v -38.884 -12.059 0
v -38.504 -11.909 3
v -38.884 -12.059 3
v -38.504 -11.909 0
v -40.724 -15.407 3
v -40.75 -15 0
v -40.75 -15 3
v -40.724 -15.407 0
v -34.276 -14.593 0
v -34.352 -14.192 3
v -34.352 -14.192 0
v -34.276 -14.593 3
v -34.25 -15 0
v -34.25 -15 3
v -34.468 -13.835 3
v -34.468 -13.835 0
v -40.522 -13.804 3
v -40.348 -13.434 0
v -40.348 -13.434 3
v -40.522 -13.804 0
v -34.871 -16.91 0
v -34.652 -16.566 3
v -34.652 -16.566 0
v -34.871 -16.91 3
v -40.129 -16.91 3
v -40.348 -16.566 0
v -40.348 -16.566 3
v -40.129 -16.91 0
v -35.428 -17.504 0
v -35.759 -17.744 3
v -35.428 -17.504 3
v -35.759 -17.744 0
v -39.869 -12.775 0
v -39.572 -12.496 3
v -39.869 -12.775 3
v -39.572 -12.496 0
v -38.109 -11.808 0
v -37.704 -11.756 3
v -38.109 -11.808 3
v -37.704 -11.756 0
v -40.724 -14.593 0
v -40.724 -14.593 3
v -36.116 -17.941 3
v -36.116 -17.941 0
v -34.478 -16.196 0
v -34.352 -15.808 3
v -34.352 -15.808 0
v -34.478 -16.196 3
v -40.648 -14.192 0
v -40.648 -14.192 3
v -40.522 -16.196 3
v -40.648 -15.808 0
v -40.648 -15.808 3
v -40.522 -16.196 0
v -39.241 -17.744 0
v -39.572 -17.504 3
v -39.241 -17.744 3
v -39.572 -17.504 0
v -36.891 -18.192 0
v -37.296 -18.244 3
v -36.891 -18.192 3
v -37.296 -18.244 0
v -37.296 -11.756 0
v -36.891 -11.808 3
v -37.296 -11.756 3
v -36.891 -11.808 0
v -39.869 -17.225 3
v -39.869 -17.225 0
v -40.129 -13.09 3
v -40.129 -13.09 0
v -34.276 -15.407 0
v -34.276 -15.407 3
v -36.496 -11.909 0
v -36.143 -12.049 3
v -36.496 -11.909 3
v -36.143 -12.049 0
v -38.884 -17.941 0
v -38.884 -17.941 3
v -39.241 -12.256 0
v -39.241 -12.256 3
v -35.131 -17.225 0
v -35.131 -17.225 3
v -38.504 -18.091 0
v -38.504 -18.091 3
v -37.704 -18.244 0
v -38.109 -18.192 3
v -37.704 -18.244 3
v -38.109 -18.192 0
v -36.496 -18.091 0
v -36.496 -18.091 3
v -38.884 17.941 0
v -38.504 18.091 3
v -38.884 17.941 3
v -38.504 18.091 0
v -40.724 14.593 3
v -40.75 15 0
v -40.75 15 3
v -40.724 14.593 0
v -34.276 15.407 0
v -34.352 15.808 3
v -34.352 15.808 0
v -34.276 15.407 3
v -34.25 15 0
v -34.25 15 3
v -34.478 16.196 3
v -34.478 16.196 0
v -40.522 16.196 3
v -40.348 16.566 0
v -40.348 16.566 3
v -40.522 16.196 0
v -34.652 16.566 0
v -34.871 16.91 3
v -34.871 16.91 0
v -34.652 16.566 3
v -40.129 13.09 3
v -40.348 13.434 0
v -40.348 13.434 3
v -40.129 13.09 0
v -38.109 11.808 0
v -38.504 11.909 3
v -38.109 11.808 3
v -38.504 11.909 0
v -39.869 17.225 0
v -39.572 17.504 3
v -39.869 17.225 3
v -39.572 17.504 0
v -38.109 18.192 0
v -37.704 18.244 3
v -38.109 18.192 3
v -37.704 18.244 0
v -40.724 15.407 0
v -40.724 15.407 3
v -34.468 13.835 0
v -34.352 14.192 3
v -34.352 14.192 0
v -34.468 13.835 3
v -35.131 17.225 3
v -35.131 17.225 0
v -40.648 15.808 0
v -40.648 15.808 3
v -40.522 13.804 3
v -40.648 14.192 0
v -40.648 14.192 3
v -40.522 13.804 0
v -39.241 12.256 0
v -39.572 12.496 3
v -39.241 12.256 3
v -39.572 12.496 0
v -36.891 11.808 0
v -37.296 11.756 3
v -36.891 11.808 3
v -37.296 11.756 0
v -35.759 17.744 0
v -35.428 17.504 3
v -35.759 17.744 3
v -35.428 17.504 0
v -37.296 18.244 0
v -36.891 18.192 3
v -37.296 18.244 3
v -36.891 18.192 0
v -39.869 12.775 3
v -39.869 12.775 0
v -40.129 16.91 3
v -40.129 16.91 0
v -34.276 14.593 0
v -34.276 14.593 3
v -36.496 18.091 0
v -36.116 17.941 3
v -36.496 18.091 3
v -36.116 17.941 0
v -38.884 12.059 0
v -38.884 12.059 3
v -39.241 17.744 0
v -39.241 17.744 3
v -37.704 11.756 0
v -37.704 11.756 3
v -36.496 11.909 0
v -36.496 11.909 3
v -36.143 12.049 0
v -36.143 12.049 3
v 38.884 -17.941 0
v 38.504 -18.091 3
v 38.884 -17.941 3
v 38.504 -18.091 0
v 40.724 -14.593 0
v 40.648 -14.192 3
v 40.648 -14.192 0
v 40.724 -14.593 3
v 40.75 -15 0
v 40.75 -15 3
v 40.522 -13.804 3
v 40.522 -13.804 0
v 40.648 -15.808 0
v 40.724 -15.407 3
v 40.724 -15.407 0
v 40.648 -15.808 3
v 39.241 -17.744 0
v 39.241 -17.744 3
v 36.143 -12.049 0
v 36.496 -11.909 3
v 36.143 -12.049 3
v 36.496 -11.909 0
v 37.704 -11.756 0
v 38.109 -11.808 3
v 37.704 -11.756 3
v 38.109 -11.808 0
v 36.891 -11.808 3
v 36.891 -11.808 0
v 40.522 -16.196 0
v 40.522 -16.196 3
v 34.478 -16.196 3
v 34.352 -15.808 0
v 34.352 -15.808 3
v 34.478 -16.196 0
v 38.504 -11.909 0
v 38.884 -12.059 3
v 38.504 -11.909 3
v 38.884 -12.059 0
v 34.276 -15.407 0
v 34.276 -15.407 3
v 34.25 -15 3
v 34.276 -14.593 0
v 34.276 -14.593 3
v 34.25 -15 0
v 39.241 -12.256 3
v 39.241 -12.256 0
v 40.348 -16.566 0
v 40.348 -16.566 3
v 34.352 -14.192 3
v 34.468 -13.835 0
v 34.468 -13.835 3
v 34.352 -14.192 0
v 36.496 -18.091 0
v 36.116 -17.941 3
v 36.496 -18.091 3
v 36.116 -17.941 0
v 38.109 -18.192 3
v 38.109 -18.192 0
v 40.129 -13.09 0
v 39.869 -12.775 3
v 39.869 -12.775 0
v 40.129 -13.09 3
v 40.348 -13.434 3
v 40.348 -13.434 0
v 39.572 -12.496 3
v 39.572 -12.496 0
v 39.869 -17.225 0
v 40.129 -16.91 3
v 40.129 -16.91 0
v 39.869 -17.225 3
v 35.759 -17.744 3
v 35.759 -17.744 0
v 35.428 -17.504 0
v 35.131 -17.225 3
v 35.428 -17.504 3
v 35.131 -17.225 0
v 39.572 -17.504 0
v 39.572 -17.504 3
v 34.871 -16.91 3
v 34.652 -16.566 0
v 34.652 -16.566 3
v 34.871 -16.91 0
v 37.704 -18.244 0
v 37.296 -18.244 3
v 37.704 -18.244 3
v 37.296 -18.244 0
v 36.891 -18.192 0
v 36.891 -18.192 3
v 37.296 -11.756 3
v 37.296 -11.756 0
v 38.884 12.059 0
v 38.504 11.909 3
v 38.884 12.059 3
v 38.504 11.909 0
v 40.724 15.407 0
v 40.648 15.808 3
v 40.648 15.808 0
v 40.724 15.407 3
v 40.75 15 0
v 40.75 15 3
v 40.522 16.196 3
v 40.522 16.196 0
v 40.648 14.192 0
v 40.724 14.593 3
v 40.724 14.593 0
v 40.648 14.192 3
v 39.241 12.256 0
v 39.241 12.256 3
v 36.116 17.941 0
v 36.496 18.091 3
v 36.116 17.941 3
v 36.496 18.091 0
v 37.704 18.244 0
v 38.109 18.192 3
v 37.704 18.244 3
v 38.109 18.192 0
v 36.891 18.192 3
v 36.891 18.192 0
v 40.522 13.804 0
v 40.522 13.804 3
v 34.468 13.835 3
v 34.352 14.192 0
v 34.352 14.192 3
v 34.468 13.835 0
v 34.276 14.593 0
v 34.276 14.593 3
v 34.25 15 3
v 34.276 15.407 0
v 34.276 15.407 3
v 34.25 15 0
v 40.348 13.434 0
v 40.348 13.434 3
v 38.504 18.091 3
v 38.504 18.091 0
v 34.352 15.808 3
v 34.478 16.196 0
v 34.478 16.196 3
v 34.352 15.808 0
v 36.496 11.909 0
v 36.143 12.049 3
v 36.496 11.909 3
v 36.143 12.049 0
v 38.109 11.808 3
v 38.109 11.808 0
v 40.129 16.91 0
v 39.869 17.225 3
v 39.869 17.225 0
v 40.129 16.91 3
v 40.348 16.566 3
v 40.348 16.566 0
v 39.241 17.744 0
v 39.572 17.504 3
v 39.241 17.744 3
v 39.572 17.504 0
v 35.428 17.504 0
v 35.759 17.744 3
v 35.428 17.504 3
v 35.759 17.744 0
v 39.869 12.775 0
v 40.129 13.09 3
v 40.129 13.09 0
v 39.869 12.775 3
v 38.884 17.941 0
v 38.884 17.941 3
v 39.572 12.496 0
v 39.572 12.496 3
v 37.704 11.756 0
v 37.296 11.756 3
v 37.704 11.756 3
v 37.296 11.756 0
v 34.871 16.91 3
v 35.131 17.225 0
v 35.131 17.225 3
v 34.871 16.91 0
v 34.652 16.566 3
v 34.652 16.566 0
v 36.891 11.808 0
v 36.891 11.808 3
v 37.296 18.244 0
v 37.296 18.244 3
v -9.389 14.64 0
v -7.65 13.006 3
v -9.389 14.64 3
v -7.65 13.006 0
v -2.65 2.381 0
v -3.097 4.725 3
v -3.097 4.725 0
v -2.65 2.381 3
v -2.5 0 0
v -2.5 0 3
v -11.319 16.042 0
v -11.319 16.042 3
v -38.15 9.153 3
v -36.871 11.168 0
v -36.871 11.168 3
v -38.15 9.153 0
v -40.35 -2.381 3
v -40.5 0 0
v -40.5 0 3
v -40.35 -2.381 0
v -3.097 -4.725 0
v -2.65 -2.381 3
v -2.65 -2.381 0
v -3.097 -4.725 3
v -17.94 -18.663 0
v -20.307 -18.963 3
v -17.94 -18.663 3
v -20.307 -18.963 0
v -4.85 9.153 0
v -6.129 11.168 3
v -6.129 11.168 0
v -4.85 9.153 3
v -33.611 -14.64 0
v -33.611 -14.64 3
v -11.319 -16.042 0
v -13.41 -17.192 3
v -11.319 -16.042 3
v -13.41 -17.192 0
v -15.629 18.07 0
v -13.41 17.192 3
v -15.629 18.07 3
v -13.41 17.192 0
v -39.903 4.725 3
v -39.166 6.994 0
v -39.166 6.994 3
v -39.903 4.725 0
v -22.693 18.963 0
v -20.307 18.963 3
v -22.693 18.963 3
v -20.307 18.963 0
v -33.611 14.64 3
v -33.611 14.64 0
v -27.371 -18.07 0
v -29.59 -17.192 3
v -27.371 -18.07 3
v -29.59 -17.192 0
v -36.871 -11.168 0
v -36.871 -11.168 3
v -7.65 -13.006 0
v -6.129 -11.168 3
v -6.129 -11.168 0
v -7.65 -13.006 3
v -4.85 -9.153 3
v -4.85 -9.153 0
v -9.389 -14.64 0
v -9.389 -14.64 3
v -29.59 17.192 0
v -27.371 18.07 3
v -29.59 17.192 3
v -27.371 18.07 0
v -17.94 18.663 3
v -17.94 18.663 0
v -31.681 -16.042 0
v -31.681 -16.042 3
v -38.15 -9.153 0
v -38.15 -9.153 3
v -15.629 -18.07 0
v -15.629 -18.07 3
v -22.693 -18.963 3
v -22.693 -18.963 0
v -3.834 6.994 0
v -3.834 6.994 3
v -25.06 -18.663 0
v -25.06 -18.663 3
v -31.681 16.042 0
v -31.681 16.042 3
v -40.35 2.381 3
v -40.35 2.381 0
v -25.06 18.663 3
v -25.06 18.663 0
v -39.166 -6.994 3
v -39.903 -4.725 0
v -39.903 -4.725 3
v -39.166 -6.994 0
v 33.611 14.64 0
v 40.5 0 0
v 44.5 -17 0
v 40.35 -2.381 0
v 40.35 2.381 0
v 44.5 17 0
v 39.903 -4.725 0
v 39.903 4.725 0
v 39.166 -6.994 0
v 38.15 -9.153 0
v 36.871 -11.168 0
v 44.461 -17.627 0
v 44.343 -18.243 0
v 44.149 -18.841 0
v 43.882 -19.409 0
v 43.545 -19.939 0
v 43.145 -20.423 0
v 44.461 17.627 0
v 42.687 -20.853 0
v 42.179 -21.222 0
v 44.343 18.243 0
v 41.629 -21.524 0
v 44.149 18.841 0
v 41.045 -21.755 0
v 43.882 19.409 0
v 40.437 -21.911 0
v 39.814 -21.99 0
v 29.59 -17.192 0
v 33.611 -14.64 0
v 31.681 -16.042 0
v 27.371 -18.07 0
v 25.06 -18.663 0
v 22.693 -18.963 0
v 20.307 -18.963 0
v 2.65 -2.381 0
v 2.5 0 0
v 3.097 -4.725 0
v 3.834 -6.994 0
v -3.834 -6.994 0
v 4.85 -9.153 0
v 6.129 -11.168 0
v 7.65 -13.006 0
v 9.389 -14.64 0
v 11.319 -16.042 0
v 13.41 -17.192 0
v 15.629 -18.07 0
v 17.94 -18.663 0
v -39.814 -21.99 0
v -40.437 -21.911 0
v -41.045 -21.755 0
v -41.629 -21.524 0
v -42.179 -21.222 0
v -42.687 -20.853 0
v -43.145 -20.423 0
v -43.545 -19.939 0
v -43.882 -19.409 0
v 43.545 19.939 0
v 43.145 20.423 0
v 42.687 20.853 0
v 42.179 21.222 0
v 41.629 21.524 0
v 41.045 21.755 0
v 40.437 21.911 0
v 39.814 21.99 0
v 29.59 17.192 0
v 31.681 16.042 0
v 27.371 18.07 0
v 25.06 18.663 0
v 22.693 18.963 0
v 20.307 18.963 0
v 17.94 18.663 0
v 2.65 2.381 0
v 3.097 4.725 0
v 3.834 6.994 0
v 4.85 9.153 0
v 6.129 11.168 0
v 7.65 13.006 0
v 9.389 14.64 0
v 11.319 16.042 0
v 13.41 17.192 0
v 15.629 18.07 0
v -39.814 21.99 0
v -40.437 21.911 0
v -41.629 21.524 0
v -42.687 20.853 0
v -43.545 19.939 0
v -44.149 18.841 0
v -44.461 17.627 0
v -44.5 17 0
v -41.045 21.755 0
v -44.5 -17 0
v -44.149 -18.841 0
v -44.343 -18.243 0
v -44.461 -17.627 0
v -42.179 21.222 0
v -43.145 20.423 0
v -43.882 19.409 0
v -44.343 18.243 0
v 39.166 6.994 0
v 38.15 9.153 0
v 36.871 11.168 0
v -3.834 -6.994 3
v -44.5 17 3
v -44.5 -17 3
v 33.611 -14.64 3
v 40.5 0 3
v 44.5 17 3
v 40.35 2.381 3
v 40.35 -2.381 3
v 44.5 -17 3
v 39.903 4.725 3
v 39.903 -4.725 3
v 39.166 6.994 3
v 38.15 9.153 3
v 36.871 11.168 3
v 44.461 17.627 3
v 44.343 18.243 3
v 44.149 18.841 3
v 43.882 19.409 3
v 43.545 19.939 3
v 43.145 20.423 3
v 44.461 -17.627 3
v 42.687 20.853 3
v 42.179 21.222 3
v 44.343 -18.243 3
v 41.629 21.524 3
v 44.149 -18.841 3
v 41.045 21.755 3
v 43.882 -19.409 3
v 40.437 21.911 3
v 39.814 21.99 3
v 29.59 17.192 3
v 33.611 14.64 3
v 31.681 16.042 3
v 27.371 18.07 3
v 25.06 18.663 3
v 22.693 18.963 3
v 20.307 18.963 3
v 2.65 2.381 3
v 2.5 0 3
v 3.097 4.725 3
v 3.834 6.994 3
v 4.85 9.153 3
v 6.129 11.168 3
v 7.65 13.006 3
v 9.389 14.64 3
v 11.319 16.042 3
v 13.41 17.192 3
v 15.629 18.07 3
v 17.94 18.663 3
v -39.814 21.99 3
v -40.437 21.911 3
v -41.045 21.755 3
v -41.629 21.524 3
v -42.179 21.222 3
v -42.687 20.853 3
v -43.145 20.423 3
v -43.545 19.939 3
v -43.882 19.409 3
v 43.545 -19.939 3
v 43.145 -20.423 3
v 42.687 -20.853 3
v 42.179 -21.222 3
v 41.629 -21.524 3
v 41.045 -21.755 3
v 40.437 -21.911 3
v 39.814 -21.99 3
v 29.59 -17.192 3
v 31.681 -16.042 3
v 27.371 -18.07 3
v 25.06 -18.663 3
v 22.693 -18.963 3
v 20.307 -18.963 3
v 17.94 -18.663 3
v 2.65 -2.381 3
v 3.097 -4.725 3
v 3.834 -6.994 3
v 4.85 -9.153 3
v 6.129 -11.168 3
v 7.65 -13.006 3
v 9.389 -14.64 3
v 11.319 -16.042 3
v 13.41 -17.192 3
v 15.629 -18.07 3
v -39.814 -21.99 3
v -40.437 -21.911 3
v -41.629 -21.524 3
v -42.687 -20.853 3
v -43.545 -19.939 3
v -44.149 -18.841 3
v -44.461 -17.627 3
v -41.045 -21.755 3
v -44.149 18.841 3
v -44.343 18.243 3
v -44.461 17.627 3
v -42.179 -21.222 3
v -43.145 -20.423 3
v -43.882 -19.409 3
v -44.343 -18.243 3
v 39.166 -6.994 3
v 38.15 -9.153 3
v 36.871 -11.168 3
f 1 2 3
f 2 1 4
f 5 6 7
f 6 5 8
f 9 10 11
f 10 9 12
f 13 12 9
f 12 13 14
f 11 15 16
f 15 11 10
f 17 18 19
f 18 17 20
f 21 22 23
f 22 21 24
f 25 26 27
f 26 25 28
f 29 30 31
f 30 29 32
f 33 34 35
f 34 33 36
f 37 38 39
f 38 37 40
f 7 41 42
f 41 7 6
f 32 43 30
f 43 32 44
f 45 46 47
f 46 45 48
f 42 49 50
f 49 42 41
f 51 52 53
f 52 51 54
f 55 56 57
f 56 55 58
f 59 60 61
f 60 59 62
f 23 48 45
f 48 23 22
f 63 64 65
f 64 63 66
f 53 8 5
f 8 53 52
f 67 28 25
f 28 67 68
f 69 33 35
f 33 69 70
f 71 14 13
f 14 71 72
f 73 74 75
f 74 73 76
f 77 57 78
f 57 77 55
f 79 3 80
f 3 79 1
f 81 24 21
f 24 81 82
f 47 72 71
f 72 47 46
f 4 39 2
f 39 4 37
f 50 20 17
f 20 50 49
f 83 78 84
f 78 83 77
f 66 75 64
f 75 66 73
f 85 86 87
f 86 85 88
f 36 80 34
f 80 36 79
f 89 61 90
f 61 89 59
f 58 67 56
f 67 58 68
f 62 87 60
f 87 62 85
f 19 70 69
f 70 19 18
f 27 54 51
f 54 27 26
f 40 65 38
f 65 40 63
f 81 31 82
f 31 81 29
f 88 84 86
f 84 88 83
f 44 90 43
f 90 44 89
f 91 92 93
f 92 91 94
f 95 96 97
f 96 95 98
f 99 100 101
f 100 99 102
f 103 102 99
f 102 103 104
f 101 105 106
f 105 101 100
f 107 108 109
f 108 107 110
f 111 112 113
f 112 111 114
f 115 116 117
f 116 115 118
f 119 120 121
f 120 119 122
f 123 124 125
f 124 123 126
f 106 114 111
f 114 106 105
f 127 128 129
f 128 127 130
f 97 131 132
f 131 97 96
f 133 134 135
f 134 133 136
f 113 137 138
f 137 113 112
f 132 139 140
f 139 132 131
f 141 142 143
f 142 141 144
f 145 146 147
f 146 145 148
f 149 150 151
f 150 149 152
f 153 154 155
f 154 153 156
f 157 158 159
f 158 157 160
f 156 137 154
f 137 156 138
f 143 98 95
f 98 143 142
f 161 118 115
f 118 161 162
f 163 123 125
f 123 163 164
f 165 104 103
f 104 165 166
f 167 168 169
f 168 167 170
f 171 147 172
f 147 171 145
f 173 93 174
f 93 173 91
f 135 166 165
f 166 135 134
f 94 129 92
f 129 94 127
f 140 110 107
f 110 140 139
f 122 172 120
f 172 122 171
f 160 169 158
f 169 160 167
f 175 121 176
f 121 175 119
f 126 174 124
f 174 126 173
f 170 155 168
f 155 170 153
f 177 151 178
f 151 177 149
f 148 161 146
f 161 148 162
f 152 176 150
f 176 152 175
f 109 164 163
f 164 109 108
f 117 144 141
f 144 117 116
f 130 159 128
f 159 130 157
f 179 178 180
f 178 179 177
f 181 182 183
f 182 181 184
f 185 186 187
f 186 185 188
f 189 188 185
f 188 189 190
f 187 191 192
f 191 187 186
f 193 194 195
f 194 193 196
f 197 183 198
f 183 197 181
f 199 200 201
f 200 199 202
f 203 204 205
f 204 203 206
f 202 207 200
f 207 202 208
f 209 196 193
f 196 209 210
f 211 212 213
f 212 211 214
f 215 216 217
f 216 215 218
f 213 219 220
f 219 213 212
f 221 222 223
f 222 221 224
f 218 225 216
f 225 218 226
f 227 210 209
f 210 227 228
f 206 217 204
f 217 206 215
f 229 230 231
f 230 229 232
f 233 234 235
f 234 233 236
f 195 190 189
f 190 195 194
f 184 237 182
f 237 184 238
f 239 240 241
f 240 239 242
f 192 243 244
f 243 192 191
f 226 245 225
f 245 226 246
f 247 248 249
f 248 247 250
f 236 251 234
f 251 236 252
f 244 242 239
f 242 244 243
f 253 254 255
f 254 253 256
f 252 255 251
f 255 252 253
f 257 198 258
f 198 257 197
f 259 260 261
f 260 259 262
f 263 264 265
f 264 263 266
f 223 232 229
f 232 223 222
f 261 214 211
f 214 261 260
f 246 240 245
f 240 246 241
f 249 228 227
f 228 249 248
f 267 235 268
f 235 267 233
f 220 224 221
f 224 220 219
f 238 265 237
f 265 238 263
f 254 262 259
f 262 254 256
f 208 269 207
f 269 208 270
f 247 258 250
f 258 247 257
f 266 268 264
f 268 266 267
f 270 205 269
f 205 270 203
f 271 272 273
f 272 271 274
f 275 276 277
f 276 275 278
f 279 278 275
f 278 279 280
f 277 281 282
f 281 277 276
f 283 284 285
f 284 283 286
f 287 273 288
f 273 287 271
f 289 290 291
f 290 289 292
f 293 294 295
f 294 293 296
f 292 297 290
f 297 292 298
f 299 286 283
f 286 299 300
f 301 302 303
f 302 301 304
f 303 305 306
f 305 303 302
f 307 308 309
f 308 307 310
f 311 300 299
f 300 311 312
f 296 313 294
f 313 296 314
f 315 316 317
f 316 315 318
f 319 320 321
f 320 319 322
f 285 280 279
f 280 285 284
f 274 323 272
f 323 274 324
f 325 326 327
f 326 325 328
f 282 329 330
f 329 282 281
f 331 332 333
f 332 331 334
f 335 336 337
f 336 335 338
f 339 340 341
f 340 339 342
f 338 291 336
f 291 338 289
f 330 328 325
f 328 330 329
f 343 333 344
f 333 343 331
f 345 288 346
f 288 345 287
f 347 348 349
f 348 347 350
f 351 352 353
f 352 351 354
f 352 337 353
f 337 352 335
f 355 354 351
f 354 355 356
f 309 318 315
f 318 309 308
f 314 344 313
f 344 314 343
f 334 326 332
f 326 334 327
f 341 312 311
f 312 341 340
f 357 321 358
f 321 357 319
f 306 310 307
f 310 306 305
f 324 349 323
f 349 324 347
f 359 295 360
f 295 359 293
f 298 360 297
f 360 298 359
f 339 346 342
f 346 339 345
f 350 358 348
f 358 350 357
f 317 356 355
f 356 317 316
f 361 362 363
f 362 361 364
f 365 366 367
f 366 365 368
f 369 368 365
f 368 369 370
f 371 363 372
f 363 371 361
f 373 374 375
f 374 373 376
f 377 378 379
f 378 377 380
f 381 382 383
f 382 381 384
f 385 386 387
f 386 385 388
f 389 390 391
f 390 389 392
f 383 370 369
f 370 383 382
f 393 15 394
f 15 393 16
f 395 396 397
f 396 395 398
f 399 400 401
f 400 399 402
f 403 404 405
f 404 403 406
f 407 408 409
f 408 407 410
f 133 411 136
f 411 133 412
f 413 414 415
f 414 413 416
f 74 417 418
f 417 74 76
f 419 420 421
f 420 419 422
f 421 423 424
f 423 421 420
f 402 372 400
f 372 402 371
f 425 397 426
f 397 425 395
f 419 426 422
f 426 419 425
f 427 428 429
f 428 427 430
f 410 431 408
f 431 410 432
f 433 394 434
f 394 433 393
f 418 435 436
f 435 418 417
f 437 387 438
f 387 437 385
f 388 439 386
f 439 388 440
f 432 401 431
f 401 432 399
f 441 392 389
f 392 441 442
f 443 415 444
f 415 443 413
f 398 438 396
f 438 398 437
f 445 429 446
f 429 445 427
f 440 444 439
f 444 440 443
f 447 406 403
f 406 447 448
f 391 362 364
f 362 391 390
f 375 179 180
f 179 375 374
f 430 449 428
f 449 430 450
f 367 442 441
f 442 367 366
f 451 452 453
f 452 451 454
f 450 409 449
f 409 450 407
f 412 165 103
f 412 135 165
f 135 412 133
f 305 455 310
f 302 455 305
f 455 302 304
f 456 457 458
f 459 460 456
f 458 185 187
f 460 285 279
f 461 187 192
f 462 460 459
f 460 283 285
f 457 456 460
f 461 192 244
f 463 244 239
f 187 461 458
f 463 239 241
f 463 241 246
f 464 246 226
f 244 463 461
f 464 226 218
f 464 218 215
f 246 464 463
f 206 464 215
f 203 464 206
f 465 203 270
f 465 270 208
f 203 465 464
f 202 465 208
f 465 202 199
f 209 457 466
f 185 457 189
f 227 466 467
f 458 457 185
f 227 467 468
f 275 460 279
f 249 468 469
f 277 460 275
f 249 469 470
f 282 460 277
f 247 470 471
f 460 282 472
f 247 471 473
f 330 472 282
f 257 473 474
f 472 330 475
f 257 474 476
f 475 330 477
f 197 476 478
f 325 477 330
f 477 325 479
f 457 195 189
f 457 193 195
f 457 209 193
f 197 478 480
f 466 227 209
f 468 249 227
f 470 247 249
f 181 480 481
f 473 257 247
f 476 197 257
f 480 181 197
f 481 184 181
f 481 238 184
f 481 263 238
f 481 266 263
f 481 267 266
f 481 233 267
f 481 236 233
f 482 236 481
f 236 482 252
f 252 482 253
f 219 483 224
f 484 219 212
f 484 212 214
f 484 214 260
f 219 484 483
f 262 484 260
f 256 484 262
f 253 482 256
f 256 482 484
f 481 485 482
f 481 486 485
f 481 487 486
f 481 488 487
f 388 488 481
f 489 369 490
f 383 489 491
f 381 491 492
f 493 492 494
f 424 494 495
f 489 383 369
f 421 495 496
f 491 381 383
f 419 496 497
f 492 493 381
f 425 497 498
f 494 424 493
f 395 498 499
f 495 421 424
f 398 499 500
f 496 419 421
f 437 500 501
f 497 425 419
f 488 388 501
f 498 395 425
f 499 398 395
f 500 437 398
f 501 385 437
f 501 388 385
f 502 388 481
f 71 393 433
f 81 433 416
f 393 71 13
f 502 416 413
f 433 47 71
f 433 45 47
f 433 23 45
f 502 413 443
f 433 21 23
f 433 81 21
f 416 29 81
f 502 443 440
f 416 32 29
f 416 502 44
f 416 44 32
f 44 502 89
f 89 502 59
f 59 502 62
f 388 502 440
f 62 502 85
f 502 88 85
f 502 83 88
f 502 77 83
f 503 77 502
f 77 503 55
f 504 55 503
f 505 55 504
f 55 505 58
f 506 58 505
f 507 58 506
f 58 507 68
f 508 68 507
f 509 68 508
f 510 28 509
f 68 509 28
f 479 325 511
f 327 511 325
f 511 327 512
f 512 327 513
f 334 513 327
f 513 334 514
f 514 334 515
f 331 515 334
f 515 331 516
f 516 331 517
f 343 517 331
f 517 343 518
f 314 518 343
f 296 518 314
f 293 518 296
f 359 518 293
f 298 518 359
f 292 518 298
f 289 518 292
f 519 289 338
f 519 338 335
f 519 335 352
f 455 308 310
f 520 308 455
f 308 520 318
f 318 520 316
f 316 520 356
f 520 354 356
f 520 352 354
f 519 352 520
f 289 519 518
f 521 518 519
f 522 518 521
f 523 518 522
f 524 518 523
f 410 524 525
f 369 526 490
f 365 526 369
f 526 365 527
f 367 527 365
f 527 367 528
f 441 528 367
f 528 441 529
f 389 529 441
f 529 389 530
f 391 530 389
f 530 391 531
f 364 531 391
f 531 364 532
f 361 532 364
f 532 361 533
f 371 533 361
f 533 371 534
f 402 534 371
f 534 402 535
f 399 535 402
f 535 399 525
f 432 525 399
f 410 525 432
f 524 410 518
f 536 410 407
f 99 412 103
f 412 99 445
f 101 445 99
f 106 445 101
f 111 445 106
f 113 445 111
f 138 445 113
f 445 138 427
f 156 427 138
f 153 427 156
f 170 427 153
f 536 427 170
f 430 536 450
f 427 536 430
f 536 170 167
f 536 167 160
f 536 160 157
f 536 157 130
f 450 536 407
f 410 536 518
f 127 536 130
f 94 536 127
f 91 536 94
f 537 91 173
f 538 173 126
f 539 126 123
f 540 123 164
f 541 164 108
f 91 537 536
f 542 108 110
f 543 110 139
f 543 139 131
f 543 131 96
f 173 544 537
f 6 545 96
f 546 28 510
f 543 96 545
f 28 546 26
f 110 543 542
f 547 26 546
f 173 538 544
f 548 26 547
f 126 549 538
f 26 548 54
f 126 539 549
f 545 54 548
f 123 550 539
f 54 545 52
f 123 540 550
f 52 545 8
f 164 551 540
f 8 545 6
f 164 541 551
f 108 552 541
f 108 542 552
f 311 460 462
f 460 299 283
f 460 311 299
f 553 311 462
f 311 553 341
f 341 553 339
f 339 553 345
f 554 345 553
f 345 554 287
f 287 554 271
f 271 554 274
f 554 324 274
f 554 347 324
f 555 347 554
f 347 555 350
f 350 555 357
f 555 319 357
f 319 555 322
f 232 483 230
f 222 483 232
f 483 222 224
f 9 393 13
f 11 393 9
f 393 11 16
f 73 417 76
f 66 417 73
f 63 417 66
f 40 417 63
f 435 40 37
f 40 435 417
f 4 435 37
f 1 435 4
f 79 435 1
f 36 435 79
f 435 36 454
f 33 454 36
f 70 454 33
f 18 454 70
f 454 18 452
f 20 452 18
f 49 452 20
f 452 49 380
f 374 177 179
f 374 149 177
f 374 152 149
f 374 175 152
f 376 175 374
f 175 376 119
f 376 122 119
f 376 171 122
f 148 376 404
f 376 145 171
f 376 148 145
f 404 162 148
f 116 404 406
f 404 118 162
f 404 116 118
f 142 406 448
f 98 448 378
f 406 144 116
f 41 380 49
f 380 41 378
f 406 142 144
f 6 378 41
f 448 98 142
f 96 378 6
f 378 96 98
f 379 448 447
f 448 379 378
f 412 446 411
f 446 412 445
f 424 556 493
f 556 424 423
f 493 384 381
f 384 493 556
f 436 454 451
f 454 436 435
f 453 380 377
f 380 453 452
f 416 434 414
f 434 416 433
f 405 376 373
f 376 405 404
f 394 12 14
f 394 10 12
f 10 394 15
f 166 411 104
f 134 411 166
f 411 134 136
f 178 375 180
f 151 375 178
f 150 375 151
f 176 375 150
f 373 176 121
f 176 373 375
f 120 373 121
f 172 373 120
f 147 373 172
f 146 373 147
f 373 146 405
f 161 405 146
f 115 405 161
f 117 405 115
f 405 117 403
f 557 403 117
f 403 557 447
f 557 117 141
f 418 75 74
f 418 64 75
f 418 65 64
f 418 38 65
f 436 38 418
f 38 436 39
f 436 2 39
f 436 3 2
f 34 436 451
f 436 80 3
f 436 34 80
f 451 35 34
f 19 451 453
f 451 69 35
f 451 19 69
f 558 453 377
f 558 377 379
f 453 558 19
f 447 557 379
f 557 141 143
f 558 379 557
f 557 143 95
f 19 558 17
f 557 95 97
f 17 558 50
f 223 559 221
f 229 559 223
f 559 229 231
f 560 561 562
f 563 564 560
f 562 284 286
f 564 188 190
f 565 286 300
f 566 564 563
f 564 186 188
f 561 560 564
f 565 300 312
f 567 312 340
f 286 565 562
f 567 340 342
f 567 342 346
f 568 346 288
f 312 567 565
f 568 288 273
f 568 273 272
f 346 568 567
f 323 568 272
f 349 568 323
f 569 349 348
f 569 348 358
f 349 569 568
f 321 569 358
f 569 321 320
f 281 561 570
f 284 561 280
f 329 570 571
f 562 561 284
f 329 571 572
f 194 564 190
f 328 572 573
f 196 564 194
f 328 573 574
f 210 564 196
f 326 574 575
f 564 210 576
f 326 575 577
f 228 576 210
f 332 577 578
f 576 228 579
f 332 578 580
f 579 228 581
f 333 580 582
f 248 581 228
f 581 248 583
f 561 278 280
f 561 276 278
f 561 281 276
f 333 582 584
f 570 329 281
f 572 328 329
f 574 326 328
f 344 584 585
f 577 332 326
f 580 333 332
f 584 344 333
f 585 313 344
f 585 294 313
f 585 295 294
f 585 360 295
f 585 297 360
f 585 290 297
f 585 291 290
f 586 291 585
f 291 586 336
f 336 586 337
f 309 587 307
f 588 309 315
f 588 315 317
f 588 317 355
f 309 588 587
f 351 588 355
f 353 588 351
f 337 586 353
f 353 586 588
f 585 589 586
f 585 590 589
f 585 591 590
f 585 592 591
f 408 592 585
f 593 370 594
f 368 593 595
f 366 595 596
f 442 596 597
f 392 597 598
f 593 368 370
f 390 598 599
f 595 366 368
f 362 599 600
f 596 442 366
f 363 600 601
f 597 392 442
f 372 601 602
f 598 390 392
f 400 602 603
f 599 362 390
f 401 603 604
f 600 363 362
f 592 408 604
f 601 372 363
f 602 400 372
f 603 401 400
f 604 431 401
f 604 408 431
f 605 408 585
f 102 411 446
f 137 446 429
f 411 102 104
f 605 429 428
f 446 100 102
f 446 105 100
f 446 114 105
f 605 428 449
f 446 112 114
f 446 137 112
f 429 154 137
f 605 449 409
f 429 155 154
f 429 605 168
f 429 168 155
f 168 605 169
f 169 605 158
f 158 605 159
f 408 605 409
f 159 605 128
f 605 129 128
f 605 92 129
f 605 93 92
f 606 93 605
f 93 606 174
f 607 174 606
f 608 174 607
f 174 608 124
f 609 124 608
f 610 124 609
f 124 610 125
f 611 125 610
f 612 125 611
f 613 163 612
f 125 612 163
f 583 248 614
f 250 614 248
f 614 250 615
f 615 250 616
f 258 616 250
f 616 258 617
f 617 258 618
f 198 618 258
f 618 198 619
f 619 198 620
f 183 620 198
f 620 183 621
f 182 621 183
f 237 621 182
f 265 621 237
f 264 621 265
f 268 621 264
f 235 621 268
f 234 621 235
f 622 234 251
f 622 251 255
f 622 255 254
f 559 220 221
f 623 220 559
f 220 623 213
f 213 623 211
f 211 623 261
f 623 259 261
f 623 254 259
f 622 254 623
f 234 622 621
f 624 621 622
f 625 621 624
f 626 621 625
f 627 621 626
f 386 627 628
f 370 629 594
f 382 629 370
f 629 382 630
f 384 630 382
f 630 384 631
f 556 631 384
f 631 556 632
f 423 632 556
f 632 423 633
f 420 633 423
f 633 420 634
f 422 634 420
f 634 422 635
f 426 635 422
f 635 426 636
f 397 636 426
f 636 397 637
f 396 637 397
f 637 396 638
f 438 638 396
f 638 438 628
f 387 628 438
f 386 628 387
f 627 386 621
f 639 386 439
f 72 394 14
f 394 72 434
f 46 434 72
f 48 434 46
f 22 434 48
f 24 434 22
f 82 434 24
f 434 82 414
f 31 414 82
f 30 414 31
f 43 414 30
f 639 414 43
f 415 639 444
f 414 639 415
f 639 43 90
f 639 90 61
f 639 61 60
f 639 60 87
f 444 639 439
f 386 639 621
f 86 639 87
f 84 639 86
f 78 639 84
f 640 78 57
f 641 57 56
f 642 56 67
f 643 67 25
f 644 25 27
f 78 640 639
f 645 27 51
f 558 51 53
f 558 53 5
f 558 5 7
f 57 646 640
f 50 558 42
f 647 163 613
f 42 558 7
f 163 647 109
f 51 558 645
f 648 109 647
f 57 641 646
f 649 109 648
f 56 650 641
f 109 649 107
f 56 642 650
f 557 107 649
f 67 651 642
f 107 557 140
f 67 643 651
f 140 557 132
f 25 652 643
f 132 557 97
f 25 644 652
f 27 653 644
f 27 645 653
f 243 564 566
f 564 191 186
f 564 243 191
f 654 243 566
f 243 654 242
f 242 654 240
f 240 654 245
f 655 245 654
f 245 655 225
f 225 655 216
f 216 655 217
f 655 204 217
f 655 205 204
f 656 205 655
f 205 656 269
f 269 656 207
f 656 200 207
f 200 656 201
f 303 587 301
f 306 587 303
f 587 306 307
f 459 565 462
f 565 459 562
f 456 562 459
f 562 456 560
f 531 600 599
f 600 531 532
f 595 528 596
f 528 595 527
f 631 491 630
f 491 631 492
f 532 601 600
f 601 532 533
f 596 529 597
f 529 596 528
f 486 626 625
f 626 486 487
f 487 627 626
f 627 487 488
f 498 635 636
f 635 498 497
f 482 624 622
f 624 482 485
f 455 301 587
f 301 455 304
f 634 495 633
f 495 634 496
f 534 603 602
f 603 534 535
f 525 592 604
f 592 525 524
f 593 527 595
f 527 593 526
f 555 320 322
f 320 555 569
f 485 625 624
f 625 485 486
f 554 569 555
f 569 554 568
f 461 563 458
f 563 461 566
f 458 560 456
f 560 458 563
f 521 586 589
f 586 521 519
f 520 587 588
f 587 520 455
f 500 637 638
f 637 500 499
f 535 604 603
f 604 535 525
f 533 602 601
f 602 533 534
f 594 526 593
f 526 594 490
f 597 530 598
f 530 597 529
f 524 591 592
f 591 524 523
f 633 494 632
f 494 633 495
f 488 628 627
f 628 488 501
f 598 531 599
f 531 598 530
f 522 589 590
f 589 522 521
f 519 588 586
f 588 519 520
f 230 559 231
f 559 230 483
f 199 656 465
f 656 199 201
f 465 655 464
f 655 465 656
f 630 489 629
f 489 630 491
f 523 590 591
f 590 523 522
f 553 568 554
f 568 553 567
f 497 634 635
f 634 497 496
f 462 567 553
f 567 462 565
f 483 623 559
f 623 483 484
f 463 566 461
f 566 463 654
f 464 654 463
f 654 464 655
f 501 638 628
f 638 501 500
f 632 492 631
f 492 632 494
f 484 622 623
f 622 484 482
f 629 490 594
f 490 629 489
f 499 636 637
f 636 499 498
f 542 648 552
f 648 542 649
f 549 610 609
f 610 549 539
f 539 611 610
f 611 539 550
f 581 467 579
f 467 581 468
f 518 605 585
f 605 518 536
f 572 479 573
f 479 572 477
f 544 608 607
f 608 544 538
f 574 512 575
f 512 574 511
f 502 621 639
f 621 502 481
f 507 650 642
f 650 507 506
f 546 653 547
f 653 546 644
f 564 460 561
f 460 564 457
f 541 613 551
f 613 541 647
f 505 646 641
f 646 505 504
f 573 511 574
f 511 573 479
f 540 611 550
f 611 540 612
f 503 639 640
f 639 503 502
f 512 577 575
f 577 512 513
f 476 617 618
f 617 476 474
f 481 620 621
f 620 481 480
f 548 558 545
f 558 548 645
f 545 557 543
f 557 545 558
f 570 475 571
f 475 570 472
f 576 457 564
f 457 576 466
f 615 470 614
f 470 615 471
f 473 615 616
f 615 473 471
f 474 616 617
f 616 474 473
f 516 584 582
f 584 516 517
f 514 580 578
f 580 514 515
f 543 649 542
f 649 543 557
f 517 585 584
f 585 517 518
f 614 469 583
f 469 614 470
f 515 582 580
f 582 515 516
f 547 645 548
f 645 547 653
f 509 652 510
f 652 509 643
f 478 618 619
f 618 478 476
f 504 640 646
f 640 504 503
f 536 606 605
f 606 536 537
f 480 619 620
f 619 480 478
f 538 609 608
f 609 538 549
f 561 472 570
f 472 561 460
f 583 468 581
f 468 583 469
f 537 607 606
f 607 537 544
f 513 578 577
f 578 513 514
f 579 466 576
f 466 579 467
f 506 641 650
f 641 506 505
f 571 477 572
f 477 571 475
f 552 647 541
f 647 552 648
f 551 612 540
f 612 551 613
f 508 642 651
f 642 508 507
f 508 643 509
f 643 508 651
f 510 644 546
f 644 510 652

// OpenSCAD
$fn = 50;

difference() {
	union() {
		hull() {
			translate(v = [-39.5, 17.0, 0]) {
				cylinder(h = 3, r = 5);
			}
			translate(v = [39.5, 17.0, 0]) {
				cylinder(h = 3, r = 5);
			}
			translate(v = [-39.5, -17.0, 0]) {
				cylinder(h = 3, r = 5);
			}
			translate(v = [39.5, -17.0, 0]) {
				cylinder(h = 3, r = 5);
			}
		}
	}
	union() {
		translate(v = [-37.5, -15.0, -100.0]) {
			cylinder(h = 200, r = 3.25);
		}
		translate(v = [-37.5, 15.0, -100.0]) {
			cylinder(h = 200, r = 3.25);
		}
		translate(v = [37.5, -15.0, -100.0]) {
			cylinder(h = 200, r = 3.25);
		}
		translate(v = [37.5, 15.0, -100.0]) {
			cylinder(h = 200, r = 3.25);
		}
		translate(v = [-37.5, -15.0, -100.0]) {
			cylinder(h = 200, r = 1.8);
		}
		translate(v = [-37.5, 15.0, -100.0]) {
			cylinder(h = 200, r = 1.8);
		}
		translate(v = [37.5, -15.0, -100.0]) {
			cylinder(h = 200, r = 1.8);
		}
		translate(v = [37.5, 15.0, -100.0]) {
			cylinder(h = 200, r = 1.8);
		}
		translate(v = [-21.5, 0, 0.0]) {
			cylinder(h = 3, r = 19.0);
		}
		translate(v = [21.5, 0, 0.0]) {
			cylinder(h = 3, r = 19.0);
		}
	}
}
